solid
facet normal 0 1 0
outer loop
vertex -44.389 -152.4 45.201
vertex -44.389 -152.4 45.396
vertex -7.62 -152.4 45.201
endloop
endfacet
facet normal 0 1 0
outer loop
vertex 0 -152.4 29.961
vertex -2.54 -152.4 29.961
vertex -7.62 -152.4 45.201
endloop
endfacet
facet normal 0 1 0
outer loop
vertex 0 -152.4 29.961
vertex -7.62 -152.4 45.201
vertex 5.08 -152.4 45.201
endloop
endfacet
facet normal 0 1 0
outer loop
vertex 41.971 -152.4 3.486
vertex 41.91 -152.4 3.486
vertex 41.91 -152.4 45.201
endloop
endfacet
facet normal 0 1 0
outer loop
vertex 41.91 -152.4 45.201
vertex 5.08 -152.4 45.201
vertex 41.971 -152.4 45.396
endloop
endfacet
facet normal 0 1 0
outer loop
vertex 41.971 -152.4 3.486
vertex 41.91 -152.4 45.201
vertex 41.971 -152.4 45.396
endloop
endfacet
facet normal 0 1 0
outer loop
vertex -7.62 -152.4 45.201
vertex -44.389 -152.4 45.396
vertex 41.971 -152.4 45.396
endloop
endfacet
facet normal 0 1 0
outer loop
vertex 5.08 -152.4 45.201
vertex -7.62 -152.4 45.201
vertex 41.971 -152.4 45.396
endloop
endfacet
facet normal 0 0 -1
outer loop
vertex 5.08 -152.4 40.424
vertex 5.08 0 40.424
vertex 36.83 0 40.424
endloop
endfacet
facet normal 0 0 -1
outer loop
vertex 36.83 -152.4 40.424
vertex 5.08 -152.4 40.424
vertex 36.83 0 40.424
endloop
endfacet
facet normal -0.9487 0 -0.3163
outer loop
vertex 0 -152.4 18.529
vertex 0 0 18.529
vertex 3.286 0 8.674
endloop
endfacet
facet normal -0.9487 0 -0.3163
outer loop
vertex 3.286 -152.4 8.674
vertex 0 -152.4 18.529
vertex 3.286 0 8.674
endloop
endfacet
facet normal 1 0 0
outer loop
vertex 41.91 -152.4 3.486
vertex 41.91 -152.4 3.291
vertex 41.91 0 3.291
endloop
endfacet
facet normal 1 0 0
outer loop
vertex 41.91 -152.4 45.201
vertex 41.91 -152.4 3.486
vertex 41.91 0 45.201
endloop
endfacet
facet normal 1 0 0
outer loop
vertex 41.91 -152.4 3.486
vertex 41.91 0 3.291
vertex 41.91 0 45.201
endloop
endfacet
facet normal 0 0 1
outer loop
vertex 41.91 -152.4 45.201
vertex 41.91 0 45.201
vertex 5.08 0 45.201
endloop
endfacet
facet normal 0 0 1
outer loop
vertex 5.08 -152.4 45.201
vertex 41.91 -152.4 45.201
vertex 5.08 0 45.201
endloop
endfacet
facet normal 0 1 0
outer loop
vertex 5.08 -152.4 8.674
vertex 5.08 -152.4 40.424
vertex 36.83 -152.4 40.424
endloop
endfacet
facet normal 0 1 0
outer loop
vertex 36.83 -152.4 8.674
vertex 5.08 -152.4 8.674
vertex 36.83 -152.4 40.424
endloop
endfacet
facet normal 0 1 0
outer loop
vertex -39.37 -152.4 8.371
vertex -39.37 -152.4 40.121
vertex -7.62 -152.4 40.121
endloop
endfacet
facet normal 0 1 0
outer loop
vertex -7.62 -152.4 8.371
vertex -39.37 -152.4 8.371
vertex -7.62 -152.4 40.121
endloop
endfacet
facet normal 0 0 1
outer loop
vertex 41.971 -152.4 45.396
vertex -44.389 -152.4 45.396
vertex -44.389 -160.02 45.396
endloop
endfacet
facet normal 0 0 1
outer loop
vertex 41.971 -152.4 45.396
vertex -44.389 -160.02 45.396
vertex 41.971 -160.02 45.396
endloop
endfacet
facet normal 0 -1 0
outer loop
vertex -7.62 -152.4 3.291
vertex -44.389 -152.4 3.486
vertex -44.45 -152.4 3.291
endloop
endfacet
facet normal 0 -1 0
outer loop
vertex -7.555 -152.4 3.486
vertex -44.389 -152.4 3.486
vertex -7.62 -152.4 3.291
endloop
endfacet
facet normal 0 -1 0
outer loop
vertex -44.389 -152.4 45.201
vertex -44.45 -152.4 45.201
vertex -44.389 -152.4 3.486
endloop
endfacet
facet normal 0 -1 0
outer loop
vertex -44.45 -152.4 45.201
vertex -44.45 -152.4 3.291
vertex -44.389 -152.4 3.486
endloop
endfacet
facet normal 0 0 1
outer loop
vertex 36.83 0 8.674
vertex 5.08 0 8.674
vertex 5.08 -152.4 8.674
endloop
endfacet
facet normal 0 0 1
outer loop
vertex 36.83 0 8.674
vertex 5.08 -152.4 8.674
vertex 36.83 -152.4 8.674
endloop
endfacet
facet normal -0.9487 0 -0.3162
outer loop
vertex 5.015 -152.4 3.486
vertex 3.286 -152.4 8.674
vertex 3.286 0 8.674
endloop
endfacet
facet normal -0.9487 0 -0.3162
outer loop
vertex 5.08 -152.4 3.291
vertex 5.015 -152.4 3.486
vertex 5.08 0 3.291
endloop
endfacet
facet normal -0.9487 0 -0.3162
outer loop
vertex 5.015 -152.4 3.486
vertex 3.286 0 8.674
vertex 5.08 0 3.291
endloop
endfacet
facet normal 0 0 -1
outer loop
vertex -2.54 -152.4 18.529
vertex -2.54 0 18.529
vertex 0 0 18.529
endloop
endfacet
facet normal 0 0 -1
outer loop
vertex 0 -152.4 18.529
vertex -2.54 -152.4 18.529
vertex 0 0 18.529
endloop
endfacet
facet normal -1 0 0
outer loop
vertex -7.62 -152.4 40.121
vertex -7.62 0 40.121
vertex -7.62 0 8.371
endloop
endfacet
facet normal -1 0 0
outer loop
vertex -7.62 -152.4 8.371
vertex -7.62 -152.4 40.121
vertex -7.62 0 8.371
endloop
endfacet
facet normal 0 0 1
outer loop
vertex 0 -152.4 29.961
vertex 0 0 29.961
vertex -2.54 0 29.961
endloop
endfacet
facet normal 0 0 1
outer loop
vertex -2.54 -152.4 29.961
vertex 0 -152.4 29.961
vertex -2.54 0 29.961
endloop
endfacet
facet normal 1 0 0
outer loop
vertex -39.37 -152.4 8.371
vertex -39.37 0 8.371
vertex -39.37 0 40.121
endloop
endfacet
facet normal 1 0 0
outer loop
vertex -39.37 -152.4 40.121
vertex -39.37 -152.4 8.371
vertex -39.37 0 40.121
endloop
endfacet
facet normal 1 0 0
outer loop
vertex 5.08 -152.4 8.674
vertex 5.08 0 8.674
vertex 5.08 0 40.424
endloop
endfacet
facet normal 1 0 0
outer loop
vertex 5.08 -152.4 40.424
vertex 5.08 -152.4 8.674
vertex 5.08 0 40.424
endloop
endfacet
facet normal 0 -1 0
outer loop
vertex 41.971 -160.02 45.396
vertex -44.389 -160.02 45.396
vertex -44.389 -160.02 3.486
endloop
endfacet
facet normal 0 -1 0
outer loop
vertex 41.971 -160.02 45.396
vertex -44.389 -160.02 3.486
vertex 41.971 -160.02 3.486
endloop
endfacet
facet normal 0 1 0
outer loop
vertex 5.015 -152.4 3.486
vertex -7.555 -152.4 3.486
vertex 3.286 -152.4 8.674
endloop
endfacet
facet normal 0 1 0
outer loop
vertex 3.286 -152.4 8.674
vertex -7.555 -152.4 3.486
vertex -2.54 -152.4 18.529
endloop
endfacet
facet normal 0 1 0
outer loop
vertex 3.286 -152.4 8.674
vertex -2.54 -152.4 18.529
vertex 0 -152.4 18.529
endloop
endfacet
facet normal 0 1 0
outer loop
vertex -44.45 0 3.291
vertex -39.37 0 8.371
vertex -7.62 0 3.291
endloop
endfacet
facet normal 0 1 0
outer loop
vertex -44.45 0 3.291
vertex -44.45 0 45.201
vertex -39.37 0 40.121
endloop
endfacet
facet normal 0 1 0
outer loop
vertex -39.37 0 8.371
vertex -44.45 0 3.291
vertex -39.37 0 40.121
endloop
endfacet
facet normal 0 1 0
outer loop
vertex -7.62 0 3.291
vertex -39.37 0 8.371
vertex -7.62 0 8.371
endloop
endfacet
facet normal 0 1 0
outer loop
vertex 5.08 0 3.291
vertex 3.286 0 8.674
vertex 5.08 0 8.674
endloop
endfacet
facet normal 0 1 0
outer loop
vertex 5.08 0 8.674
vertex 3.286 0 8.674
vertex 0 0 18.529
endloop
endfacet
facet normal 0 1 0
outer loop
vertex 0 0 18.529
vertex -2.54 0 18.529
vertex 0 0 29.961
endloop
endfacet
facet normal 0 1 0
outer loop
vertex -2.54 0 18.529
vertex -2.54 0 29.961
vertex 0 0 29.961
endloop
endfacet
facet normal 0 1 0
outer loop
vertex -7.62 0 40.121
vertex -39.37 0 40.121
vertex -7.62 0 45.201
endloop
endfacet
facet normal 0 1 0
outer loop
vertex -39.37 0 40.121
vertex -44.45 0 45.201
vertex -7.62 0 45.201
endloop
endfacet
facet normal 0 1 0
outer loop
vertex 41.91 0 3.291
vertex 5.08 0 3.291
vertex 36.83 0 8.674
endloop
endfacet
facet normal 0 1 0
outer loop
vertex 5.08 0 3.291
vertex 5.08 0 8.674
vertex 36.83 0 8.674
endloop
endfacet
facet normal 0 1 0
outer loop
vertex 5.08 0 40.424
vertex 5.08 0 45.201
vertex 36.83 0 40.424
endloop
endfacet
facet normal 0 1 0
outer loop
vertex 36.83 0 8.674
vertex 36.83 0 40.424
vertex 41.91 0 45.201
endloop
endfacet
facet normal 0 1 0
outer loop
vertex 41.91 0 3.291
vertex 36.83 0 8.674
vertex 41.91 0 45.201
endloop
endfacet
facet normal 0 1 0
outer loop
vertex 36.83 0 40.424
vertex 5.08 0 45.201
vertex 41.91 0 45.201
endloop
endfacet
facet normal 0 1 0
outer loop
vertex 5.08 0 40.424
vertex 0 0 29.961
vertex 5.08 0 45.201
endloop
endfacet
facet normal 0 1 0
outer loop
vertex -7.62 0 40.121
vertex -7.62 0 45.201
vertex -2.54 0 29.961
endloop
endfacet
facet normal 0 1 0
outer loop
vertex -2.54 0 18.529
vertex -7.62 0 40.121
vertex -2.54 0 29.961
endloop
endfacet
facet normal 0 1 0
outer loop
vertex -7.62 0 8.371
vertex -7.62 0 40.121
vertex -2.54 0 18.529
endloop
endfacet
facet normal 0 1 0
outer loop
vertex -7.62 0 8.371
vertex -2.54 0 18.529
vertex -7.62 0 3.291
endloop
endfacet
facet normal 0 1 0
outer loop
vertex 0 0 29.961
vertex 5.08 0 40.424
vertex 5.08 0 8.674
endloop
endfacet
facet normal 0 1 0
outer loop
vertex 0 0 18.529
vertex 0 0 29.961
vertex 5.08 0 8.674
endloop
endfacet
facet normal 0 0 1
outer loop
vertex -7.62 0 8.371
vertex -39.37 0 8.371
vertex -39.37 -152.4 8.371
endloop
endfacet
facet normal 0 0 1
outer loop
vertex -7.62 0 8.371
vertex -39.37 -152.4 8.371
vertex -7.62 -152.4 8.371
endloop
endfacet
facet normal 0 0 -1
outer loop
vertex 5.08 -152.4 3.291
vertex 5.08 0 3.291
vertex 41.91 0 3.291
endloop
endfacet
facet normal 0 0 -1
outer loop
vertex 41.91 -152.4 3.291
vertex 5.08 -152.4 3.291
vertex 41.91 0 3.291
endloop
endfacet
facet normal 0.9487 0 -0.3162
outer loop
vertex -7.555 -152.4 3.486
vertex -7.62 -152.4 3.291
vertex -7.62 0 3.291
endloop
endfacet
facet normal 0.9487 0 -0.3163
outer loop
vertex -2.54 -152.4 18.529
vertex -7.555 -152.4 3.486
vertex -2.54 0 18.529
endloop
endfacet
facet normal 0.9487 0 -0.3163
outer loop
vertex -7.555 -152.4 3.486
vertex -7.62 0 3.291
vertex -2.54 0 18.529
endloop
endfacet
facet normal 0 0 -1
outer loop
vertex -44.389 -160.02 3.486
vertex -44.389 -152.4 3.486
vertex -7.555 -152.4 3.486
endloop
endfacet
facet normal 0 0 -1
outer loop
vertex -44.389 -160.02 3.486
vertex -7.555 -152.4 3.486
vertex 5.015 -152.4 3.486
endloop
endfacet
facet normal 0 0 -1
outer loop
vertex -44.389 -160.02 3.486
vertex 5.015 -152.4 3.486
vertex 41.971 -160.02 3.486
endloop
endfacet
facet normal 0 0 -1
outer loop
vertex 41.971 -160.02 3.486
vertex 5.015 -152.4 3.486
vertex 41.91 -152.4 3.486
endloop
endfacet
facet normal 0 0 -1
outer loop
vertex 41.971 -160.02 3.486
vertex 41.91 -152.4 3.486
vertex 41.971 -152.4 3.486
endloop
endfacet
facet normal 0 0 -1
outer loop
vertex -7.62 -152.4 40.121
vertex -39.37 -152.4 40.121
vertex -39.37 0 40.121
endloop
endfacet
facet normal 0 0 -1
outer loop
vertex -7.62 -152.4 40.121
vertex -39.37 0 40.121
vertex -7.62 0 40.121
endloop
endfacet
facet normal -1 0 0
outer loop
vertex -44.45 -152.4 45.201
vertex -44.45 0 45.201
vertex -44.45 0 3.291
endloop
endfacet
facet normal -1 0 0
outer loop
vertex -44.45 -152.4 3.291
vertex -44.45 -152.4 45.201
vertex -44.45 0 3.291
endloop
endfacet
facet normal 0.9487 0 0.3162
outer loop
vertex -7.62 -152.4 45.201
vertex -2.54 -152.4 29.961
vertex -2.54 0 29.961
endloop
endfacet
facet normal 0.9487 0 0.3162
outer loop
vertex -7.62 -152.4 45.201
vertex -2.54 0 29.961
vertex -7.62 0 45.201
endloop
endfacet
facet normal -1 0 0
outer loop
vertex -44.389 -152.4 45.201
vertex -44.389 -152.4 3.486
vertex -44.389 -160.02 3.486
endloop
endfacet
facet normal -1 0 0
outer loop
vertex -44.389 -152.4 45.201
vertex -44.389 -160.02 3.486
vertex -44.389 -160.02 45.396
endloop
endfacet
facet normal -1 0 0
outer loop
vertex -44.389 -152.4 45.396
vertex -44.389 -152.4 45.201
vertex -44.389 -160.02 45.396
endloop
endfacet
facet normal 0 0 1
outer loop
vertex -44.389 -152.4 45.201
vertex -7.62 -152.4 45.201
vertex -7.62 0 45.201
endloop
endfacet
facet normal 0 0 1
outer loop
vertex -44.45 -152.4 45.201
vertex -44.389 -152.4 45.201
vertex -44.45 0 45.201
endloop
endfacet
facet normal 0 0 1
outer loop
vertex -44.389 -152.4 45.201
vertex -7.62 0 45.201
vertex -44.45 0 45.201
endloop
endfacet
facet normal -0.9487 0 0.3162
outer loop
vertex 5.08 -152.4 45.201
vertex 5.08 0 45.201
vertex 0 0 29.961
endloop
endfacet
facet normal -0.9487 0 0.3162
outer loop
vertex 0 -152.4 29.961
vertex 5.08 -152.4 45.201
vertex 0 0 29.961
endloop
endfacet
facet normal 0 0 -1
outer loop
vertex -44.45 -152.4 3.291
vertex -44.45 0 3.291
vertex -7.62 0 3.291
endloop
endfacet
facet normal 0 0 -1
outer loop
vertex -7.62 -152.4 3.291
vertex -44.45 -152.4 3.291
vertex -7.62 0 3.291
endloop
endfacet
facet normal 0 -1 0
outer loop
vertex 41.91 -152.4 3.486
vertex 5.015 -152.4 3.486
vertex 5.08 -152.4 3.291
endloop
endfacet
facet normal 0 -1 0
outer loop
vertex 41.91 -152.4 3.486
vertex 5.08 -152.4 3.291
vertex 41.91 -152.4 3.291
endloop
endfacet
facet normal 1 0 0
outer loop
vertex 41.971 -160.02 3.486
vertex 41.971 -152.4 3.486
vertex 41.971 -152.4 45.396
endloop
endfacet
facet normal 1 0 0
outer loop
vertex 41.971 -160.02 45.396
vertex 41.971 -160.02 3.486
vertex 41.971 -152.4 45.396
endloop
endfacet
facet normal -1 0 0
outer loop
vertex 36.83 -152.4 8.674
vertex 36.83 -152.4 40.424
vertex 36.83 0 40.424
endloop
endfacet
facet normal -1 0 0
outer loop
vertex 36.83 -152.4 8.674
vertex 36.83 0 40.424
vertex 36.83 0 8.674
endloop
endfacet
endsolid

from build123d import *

# Parameters (mm, degrees)
F0_W     = 31.75
F0_H     = 5.3823811583
F0_W_2   = 2.54
F0_H_2   = 11.4322254079
F0_W_3   = 5.08
F0_H_3   = 5.08
F0_H_4   = 31.75
F1_DEPTH = 152.4
F3_W     = 86.36
F3_H     = 41.91
F4_DEPTH = 7.62


with BuildPart() as f1:
    # F0 (on Front) → F1 (new body)
    with BuildSketch(Plane.XZ):
        with Locations((20.955, 5.9824082972)):
            Rectangle(F0_W, F0_H)
        with Locations((-1.27, 24.2451050141)):
            Rectangle(F0_W_2, F0_H_2)
        Polygon((5.08, 45.2012177181), (0, 29.9612177181), (5.08, 29.9612177181), (5.08, 40.4235988763), align=None)
        Polygon((41.91, 45.2012177181), (5.08, 45.2012177181), (5.08, 40.4235988763), (36.83, 40.4235988763), (36.83, 8.6735988763), (41.91, 8.6735988763), align=None)
        with Locations((39.37, 5.9824082972)):
            Rectangle(F0_W_3, F0_H)
        with Locations((-5.08, 24.2451050141)):
            Rectangle(F0_W_3, F0_H_2)
        with Locations((-23.495, 42.6612177181)):
            Rectangle(F0_W, F0_H_3)
        with Locations((-41.91, 42.6612177181)):
            Rectangle(F0_W_3, F0_H_3)
        with Locations((-41.91, 24.2462177181)):
            Rectangle(F0_W_3, F0_H_4)
        with Locations((-41.91, 5.8312177181)):
            Rectangle(F0_W_3, F0_H_3)
        with Locations((-23.495, 5.8312177181)):
            Rectangle(F0_W, F0_H_3)
        Polygon((-7.62, 18.5289923102), (-7.62, 8.3712177181), (-7.62, 3.2912177181), (-2.54, 18.5289923102), align=None)
        with Locations((2.54, 24.2451050141)):
            Rectangle(F0_W_3, F0_H_2)
        Polygon((5.08, 8.6735988763), (3.2856109231, 8.6735988763), (5.08, 3.2912177181), align=None)
        Polygon((5.08, 18.5289923102), (0, 18.5289923102), (3.2856109231, 8.6735988763), (5.08, 8.6735988763), align=None)
        Polygon((-7.62, 45.2012177181), (-7.62, 40.1212177181), (-7.62, 29.9612177181), (-2.54, 29.9612177181), align=None)
    extrude(amount=F1_DEPTH)

    # F3 (on offset) → F4 (join)
    with BuildSketch(Plane.XZ.offset(152.4)):
        with Locations((-1.2090988457, 24.44053792)):
            Rectangle(F3_W, F3_H)
    extrude(amount=F4_DEPTH)


solid = f1.part
